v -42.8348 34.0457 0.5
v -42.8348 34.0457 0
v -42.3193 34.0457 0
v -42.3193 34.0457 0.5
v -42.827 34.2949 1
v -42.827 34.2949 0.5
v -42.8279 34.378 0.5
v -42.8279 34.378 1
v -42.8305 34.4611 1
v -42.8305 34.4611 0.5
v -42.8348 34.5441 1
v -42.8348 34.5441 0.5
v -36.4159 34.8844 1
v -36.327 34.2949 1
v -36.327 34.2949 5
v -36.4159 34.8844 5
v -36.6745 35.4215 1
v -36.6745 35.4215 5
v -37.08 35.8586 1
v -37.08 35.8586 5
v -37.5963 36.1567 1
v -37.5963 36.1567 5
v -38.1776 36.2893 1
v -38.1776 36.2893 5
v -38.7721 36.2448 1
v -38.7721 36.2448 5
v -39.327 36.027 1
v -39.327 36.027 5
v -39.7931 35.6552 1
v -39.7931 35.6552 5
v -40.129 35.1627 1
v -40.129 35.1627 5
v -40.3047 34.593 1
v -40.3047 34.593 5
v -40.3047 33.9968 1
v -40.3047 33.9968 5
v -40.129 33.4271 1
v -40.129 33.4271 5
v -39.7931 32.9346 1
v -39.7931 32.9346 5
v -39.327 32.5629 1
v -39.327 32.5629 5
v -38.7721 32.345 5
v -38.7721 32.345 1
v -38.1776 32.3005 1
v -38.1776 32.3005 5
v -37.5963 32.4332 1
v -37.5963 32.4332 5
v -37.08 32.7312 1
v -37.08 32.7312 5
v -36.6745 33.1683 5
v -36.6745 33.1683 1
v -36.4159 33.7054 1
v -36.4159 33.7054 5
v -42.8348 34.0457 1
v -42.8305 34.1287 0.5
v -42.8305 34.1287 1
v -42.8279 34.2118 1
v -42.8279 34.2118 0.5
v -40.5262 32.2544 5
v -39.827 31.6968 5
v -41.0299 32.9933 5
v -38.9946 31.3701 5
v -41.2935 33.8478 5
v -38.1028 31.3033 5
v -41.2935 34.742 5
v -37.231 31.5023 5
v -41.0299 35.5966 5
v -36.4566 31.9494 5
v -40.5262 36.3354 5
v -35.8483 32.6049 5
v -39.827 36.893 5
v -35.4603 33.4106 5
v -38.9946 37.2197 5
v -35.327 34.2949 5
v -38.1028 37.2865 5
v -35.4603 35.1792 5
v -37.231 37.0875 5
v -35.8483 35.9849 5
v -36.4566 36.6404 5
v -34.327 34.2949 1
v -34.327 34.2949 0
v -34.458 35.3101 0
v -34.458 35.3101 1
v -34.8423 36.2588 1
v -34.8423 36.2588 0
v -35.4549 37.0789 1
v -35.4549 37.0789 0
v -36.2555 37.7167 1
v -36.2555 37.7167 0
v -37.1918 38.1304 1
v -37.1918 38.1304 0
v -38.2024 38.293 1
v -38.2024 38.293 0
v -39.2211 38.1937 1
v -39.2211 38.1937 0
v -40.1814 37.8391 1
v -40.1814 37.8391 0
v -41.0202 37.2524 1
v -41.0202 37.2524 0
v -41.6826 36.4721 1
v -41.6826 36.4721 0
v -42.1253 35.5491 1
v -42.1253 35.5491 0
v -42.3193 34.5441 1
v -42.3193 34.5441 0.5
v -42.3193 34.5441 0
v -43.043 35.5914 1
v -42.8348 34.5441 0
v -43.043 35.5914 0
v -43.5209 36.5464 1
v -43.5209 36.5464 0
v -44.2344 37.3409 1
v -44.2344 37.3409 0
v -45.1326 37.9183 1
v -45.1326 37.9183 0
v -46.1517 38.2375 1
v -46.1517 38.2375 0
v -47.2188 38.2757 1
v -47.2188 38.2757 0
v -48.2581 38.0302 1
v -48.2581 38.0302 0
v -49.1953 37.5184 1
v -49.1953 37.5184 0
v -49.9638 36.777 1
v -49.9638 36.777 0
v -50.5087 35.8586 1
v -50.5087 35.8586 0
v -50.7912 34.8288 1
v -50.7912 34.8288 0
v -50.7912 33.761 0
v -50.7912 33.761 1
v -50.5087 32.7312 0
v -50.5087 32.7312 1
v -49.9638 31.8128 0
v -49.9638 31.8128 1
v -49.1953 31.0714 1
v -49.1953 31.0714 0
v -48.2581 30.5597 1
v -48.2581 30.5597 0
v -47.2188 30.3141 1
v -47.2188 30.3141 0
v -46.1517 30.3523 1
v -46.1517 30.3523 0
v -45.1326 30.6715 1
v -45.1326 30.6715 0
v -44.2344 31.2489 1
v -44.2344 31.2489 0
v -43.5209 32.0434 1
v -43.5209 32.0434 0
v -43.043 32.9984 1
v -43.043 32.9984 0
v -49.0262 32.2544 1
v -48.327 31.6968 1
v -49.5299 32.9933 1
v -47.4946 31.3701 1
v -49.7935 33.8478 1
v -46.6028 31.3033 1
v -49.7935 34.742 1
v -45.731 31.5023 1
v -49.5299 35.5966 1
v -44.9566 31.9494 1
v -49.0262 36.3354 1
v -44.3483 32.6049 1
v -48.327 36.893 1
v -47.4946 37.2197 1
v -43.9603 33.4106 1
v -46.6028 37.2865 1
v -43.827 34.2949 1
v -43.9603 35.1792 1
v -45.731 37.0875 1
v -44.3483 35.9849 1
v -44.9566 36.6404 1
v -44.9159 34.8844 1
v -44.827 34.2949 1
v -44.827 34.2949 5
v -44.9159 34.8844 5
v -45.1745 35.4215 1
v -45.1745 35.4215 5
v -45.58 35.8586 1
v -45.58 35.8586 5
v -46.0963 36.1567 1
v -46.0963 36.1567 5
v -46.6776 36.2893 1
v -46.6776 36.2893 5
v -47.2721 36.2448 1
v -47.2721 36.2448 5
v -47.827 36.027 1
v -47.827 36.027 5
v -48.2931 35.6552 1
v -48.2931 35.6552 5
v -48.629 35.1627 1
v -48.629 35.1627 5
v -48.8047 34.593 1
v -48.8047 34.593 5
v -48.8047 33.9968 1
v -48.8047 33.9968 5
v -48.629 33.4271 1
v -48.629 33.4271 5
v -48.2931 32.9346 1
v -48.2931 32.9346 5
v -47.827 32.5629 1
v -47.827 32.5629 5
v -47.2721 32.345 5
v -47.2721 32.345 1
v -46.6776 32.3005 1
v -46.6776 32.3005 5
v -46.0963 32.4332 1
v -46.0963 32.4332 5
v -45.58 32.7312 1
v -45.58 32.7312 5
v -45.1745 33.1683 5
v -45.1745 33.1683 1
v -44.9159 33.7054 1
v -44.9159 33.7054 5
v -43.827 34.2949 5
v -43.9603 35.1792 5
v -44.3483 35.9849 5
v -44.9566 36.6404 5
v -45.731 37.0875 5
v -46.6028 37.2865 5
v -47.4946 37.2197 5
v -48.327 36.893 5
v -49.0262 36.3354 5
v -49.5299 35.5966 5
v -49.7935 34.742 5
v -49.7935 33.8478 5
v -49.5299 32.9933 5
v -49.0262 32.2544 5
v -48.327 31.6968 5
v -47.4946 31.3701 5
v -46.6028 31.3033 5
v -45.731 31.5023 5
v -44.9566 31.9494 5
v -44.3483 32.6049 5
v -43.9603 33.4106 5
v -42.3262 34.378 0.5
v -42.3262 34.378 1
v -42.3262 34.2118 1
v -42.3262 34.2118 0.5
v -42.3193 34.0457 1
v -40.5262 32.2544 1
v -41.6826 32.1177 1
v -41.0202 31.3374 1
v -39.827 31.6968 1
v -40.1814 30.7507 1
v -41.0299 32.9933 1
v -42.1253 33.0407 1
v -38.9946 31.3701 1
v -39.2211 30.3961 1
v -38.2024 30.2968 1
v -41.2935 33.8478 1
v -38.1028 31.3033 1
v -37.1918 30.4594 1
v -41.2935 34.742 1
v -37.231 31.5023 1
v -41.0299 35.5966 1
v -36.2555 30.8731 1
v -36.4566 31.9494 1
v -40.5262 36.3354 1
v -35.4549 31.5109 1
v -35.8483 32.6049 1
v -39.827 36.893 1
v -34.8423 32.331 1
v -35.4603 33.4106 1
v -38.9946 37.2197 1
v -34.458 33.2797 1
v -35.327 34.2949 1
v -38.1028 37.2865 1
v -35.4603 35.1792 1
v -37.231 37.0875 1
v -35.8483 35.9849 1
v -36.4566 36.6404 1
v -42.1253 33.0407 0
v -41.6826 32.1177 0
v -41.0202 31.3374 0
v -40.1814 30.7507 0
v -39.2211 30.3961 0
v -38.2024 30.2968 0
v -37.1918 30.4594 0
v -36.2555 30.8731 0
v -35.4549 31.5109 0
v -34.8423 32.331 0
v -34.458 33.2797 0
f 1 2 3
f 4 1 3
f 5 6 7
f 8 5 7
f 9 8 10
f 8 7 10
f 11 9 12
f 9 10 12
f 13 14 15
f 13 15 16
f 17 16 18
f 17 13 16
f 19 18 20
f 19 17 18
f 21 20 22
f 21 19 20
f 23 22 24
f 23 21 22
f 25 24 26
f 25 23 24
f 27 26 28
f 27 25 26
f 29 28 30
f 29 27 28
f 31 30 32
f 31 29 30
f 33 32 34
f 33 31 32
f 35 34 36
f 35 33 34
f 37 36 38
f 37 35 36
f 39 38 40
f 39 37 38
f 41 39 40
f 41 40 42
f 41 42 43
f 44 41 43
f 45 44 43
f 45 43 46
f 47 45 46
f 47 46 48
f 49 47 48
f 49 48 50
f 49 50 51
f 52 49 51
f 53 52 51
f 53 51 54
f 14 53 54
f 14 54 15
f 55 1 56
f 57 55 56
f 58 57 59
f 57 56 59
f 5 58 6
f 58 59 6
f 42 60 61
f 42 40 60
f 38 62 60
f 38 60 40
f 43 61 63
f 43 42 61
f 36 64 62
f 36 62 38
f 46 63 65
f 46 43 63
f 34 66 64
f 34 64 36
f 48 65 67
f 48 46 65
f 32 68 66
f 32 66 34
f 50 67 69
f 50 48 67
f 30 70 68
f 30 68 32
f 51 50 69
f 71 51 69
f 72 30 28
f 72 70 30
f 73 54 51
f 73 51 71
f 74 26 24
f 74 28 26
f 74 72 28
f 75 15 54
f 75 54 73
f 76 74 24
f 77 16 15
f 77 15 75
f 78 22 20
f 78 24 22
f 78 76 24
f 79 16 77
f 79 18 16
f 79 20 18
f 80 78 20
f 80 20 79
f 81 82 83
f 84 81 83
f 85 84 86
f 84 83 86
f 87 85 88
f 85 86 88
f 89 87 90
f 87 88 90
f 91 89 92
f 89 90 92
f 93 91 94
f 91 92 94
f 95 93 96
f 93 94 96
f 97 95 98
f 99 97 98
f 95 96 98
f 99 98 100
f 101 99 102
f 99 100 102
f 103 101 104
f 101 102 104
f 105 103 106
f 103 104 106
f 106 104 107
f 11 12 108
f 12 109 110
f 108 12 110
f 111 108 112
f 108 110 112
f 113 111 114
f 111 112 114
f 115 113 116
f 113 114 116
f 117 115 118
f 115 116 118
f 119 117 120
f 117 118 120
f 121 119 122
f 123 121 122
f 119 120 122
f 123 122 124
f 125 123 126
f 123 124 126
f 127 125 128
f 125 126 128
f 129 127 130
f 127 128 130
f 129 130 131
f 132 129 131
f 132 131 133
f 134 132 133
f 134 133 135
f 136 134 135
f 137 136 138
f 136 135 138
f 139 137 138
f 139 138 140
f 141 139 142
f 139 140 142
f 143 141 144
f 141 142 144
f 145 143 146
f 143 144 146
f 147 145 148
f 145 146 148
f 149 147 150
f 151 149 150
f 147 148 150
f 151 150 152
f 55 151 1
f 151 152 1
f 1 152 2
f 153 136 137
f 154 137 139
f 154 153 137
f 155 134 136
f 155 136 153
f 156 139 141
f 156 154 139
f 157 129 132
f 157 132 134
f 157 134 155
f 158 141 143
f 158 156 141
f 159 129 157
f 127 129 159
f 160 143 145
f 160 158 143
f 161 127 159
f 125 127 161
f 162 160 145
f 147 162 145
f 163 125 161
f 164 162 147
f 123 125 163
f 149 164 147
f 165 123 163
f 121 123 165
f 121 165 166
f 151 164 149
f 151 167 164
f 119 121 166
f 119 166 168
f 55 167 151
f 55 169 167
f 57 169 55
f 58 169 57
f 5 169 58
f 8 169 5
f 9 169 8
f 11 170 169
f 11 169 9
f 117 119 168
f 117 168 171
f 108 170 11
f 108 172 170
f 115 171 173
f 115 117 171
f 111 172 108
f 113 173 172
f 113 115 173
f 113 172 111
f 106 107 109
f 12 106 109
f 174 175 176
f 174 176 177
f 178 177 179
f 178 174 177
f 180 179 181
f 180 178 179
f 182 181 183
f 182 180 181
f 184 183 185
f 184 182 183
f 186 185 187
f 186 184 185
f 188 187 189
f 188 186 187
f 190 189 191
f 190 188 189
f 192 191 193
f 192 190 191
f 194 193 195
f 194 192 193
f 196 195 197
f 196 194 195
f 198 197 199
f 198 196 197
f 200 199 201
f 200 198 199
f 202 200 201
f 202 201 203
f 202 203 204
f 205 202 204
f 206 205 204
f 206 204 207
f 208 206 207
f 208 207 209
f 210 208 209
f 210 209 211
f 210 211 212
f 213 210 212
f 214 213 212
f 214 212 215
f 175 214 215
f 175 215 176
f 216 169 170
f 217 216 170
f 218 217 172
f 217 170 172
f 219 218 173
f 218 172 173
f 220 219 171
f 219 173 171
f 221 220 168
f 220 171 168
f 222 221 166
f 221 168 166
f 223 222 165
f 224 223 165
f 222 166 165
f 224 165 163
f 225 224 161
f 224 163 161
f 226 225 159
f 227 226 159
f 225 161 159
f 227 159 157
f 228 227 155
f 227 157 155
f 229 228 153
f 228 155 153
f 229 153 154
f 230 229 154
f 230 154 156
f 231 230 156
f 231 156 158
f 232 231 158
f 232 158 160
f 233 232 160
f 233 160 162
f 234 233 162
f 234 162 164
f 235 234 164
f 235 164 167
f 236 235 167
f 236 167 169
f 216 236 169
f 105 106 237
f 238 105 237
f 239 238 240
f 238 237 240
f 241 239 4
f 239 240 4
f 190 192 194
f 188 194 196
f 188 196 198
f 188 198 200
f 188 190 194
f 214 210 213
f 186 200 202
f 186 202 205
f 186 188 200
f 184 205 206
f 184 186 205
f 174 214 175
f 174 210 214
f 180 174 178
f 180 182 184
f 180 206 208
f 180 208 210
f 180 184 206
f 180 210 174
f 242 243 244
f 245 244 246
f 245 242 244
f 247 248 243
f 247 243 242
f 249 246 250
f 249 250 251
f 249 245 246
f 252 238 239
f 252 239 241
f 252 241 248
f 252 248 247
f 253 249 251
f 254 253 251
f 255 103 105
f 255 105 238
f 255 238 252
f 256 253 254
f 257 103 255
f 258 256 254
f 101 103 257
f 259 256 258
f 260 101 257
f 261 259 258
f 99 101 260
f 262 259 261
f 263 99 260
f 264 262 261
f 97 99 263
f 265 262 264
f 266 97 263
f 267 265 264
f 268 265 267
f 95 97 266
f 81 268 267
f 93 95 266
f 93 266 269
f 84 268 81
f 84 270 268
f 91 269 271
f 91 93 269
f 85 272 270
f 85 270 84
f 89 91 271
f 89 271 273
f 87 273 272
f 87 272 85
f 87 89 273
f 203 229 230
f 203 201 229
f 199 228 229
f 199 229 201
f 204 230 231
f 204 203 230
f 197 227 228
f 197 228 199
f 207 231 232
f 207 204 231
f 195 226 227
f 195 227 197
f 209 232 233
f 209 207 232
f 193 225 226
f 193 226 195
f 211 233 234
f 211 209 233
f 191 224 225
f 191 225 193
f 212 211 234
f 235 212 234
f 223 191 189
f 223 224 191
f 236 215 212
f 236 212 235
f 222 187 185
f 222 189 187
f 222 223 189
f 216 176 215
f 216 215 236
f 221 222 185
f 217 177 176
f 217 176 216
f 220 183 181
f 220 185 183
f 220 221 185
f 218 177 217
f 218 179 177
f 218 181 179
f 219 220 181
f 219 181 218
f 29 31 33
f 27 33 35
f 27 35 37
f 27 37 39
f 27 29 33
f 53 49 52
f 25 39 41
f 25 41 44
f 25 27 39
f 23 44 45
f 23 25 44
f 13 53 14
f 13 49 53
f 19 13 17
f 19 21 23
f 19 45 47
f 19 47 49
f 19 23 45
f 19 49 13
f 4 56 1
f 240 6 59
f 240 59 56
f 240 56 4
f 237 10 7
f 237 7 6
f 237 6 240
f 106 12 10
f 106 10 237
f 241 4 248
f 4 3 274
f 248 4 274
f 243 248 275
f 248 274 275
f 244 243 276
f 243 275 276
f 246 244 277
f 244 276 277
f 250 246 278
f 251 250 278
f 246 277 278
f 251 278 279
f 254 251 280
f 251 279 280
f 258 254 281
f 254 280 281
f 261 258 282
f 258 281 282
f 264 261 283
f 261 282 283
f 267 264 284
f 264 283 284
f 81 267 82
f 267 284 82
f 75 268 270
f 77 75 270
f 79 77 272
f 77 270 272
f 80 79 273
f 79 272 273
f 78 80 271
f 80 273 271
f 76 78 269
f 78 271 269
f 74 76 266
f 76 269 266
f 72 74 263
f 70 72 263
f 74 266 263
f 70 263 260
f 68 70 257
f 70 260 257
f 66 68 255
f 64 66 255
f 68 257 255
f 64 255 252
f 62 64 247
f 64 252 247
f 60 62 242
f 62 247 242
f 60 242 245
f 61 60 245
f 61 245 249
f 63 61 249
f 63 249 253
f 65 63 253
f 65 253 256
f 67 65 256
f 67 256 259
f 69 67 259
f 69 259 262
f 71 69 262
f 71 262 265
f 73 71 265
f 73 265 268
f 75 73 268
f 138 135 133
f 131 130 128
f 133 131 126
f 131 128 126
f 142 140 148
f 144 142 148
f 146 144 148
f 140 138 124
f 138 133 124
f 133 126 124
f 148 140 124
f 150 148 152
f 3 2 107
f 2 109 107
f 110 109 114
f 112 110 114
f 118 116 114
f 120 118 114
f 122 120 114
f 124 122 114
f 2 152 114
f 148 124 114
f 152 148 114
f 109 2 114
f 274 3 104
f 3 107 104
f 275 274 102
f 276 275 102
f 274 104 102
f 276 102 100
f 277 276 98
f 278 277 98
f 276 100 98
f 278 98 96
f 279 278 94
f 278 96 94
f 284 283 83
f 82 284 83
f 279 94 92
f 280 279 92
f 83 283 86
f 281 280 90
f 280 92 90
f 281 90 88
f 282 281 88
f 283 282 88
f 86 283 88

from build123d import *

# Parameters (mm, degrees)
F0_R     = 3
F0_R_2   = 2
F1_DEPTH = 5
F2_DEPTH = 1
F3_DEPTH = 0.5


# Not quite as in the source:
# - a feature names something its author has since deleted; it is built from what else it names


with BuildPart() as f1:
    # F0 (on Top) → F1 (new body)
    with BuildSketch(Plane.XY):
        with Locations((-46.8270219862, 34.2949032784)):
            Circle(F0_R)
        with Locations((-46.8270219862, 34.2949032784)):
            Circle(F0_R_2, mode=Mode.SUBTRACT)
    extrude(amount=F1_DEPTH)

    # F0 (on Top) → F2 (join)
    with BuildSketch(Plane.XY):
        with BuildLine():
            ThreePointArc((-42.8347911995, 34.0457179145), (-42.8289647614, 34.1702500531), (-42.8270219862, 34.2949032784))
            ThreePointArc((-42.8270219862, 34.2949032784), (-42.8289647614, 34.4195565036), (-42.8347911995, 34.5440886422))
            ThreePointArc((-42.8347911995, 34.5440886422), (-50.8270219862, 34.2949032784), (-42.8347911995, 34.0457179145))
        make_face()
        with Locations((-46.8270219862, 34.2949032784)):
            Circle(F0_R, mode=Mode.SUBTRACT)
        with Locations((-46.8270219862, 34.2949032784)):
            Circle(F0_R_2)
    extrude(amount=F2_DEPTH)



with BuildPart() as f1b:
    # F0 (on Top) → F1, piece 2 (new body)
    with BuildSketch(Plane.XY):
        with Locations((-38.3270219862, 34.2949032784)):
            Circle(F0_R)
        with Locations((-38.3270219862, 34.2949032784)):
            Circle(F0_R_2, mode=Mode.SUBTRACT)
    extrude(amount=F1_DEPTH)

    # F0 (on Top) → F2, piece 2 (join)
    with BuildSketch(Plane.XY):
        with BuildLine():
            ThreePointArc((-34.3270219862, 34.2949032784), (-38.202368761, 38.2929605032), (-42.319252773, 34.5440886422))
            ThreePointArc((-42.319252773, 34.5440886422), (-42.3270219862, 34.2949032784), (-42.319252773, 34.0457179145))
            ThreePointArc((-42.319252773, 34.0457179145), (-38.202368761, 30.2968460535), (-34.3270219862, 34.2949032784))
        make_face()
        with Locations((-38.3270219862, 34.2949032784)):
            Circle(F0_R, mode=Mode.SUBTRACT)
        with Locations((-38.3270219862, 34.2949032784)):
            Circle(F0_R_2)
    extrude(amount=F2_DEPTH)


with BuildPart() as f1_1:
    add(f1.part)

    add(f1b.part)  # F3 merges F1b
    # F0 (on Top) → F3 (join)
    with BuildSketch(Plane.XY):
        with BuildLine():
            ThreePointArc((-42.8347911995, 34.5440886422), (-42.8289647614, 34.4195565036), (-42.8270219862, 34.2949032784))
            ThreePointArc((-42.8270219862, 34.2949032784), (-42.8289647614, 34.1702500531), (-42.8347911995, 34.0457179145))
            Line((-42.8347911995, 34.0457179145), (-42.319252773, 34.0457179145))
            ThreePointArc((-42.319252773, 34.0457179145), (-42.3270219862, 34.2949032784), (-42.319252773, 34.5440886422))
            Line((-42.319252773, 34.5440886422), (-42.8347911995, 34.5440886422))
        make_face()
    extrude(amount=F3_DEPTH)


solid = f1_1.part
